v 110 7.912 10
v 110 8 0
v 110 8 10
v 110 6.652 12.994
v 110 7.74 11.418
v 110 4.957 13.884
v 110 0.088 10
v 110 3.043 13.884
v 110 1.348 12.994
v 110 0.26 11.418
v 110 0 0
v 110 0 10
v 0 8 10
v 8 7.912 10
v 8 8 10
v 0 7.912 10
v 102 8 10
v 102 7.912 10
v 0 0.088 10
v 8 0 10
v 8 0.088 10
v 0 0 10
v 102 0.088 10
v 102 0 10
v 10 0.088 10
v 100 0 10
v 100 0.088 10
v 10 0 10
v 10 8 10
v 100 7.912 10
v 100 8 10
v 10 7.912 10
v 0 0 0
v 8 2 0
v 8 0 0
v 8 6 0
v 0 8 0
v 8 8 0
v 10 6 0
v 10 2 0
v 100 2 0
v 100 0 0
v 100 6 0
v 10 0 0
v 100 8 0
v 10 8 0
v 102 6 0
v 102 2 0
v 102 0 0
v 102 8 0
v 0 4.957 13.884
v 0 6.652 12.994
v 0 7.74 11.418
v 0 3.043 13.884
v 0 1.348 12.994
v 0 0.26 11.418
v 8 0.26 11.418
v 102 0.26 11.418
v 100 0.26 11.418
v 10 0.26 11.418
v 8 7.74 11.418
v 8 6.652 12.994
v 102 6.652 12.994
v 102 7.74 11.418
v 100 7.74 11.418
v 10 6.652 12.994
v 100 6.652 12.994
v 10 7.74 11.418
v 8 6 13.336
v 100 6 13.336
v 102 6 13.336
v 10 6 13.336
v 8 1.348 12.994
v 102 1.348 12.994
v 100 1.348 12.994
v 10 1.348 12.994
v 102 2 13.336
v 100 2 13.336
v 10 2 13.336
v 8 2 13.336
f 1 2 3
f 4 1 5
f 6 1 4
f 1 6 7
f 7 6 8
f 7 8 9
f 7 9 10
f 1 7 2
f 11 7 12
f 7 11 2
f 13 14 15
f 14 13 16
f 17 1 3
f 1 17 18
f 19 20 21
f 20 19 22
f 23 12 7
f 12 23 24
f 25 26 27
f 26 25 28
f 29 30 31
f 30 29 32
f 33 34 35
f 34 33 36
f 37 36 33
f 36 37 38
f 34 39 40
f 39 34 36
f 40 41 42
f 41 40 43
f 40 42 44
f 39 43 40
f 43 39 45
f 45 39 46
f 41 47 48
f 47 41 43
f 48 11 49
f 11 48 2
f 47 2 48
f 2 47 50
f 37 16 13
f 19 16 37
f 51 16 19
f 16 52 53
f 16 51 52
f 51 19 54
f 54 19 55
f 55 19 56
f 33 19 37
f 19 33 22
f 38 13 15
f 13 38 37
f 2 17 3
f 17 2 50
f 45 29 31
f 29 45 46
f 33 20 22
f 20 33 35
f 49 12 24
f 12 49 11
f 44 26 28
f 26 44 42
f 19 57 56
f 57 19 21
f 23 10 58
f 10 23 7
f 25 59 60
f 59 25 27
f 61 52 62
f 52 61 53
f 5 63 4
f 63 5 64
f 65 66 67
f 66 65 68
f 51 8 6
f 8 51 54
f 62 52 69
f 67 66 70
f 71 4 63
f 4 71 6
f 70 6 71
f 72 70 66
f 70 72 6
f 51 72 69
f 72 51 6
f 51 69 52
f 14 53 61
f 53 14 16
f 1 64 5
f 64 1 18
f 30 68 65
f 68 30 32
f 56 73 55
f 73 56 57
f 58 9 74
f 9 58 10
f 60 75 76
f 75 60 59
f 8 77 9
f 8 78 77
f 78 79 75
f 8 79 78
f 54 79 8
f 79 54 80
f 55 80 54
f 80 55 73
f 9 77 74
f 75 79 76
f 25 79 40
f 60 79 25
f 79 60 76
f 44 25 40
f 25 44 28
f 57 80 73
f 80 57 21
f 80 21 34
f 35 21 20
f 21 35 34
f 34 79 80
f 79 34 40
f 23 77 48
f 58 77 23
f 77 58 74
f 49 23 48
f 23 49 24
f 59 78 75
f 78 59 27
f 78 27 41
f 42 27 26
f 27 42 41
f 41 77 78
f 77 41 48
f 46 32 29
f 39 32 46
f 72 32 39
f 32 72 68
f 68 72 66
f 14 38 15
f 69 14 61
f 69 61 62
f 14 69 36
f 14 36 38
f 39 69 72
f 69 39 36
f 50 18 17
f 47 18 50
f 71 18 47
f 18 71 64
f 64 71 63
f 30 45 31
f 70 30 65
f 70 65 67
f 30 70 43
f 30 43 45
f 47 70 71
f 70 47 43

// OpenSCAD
// Configurator variables

// length of the bar in mm.
bar_length = 110;

// End of configurator variables

/* [Hidden] */

bar_height = 10;
bar_width = 8;
difference()
{
  union()
  {
    cube([bar_length, bar_width, bar_height]);
    translate([0, bar_width/2, bar_height]) rotate([0,90,0]) cylinder(d=bar_width, h=bar_length);
  }
  translate([8,0,0])
    cube([2,2,bar_height+bar_width]);
  translate([bar_length-10,0,0])
    cube([2,2,bar_height+bar_width]);
  translate([8,bar_width-2,0])
    cube([2,2,bar_height+bar_width]);
  translate([bar_length-10,bar_width-2,0])
    cube([2,2,bar_height+bar_width]);
}
